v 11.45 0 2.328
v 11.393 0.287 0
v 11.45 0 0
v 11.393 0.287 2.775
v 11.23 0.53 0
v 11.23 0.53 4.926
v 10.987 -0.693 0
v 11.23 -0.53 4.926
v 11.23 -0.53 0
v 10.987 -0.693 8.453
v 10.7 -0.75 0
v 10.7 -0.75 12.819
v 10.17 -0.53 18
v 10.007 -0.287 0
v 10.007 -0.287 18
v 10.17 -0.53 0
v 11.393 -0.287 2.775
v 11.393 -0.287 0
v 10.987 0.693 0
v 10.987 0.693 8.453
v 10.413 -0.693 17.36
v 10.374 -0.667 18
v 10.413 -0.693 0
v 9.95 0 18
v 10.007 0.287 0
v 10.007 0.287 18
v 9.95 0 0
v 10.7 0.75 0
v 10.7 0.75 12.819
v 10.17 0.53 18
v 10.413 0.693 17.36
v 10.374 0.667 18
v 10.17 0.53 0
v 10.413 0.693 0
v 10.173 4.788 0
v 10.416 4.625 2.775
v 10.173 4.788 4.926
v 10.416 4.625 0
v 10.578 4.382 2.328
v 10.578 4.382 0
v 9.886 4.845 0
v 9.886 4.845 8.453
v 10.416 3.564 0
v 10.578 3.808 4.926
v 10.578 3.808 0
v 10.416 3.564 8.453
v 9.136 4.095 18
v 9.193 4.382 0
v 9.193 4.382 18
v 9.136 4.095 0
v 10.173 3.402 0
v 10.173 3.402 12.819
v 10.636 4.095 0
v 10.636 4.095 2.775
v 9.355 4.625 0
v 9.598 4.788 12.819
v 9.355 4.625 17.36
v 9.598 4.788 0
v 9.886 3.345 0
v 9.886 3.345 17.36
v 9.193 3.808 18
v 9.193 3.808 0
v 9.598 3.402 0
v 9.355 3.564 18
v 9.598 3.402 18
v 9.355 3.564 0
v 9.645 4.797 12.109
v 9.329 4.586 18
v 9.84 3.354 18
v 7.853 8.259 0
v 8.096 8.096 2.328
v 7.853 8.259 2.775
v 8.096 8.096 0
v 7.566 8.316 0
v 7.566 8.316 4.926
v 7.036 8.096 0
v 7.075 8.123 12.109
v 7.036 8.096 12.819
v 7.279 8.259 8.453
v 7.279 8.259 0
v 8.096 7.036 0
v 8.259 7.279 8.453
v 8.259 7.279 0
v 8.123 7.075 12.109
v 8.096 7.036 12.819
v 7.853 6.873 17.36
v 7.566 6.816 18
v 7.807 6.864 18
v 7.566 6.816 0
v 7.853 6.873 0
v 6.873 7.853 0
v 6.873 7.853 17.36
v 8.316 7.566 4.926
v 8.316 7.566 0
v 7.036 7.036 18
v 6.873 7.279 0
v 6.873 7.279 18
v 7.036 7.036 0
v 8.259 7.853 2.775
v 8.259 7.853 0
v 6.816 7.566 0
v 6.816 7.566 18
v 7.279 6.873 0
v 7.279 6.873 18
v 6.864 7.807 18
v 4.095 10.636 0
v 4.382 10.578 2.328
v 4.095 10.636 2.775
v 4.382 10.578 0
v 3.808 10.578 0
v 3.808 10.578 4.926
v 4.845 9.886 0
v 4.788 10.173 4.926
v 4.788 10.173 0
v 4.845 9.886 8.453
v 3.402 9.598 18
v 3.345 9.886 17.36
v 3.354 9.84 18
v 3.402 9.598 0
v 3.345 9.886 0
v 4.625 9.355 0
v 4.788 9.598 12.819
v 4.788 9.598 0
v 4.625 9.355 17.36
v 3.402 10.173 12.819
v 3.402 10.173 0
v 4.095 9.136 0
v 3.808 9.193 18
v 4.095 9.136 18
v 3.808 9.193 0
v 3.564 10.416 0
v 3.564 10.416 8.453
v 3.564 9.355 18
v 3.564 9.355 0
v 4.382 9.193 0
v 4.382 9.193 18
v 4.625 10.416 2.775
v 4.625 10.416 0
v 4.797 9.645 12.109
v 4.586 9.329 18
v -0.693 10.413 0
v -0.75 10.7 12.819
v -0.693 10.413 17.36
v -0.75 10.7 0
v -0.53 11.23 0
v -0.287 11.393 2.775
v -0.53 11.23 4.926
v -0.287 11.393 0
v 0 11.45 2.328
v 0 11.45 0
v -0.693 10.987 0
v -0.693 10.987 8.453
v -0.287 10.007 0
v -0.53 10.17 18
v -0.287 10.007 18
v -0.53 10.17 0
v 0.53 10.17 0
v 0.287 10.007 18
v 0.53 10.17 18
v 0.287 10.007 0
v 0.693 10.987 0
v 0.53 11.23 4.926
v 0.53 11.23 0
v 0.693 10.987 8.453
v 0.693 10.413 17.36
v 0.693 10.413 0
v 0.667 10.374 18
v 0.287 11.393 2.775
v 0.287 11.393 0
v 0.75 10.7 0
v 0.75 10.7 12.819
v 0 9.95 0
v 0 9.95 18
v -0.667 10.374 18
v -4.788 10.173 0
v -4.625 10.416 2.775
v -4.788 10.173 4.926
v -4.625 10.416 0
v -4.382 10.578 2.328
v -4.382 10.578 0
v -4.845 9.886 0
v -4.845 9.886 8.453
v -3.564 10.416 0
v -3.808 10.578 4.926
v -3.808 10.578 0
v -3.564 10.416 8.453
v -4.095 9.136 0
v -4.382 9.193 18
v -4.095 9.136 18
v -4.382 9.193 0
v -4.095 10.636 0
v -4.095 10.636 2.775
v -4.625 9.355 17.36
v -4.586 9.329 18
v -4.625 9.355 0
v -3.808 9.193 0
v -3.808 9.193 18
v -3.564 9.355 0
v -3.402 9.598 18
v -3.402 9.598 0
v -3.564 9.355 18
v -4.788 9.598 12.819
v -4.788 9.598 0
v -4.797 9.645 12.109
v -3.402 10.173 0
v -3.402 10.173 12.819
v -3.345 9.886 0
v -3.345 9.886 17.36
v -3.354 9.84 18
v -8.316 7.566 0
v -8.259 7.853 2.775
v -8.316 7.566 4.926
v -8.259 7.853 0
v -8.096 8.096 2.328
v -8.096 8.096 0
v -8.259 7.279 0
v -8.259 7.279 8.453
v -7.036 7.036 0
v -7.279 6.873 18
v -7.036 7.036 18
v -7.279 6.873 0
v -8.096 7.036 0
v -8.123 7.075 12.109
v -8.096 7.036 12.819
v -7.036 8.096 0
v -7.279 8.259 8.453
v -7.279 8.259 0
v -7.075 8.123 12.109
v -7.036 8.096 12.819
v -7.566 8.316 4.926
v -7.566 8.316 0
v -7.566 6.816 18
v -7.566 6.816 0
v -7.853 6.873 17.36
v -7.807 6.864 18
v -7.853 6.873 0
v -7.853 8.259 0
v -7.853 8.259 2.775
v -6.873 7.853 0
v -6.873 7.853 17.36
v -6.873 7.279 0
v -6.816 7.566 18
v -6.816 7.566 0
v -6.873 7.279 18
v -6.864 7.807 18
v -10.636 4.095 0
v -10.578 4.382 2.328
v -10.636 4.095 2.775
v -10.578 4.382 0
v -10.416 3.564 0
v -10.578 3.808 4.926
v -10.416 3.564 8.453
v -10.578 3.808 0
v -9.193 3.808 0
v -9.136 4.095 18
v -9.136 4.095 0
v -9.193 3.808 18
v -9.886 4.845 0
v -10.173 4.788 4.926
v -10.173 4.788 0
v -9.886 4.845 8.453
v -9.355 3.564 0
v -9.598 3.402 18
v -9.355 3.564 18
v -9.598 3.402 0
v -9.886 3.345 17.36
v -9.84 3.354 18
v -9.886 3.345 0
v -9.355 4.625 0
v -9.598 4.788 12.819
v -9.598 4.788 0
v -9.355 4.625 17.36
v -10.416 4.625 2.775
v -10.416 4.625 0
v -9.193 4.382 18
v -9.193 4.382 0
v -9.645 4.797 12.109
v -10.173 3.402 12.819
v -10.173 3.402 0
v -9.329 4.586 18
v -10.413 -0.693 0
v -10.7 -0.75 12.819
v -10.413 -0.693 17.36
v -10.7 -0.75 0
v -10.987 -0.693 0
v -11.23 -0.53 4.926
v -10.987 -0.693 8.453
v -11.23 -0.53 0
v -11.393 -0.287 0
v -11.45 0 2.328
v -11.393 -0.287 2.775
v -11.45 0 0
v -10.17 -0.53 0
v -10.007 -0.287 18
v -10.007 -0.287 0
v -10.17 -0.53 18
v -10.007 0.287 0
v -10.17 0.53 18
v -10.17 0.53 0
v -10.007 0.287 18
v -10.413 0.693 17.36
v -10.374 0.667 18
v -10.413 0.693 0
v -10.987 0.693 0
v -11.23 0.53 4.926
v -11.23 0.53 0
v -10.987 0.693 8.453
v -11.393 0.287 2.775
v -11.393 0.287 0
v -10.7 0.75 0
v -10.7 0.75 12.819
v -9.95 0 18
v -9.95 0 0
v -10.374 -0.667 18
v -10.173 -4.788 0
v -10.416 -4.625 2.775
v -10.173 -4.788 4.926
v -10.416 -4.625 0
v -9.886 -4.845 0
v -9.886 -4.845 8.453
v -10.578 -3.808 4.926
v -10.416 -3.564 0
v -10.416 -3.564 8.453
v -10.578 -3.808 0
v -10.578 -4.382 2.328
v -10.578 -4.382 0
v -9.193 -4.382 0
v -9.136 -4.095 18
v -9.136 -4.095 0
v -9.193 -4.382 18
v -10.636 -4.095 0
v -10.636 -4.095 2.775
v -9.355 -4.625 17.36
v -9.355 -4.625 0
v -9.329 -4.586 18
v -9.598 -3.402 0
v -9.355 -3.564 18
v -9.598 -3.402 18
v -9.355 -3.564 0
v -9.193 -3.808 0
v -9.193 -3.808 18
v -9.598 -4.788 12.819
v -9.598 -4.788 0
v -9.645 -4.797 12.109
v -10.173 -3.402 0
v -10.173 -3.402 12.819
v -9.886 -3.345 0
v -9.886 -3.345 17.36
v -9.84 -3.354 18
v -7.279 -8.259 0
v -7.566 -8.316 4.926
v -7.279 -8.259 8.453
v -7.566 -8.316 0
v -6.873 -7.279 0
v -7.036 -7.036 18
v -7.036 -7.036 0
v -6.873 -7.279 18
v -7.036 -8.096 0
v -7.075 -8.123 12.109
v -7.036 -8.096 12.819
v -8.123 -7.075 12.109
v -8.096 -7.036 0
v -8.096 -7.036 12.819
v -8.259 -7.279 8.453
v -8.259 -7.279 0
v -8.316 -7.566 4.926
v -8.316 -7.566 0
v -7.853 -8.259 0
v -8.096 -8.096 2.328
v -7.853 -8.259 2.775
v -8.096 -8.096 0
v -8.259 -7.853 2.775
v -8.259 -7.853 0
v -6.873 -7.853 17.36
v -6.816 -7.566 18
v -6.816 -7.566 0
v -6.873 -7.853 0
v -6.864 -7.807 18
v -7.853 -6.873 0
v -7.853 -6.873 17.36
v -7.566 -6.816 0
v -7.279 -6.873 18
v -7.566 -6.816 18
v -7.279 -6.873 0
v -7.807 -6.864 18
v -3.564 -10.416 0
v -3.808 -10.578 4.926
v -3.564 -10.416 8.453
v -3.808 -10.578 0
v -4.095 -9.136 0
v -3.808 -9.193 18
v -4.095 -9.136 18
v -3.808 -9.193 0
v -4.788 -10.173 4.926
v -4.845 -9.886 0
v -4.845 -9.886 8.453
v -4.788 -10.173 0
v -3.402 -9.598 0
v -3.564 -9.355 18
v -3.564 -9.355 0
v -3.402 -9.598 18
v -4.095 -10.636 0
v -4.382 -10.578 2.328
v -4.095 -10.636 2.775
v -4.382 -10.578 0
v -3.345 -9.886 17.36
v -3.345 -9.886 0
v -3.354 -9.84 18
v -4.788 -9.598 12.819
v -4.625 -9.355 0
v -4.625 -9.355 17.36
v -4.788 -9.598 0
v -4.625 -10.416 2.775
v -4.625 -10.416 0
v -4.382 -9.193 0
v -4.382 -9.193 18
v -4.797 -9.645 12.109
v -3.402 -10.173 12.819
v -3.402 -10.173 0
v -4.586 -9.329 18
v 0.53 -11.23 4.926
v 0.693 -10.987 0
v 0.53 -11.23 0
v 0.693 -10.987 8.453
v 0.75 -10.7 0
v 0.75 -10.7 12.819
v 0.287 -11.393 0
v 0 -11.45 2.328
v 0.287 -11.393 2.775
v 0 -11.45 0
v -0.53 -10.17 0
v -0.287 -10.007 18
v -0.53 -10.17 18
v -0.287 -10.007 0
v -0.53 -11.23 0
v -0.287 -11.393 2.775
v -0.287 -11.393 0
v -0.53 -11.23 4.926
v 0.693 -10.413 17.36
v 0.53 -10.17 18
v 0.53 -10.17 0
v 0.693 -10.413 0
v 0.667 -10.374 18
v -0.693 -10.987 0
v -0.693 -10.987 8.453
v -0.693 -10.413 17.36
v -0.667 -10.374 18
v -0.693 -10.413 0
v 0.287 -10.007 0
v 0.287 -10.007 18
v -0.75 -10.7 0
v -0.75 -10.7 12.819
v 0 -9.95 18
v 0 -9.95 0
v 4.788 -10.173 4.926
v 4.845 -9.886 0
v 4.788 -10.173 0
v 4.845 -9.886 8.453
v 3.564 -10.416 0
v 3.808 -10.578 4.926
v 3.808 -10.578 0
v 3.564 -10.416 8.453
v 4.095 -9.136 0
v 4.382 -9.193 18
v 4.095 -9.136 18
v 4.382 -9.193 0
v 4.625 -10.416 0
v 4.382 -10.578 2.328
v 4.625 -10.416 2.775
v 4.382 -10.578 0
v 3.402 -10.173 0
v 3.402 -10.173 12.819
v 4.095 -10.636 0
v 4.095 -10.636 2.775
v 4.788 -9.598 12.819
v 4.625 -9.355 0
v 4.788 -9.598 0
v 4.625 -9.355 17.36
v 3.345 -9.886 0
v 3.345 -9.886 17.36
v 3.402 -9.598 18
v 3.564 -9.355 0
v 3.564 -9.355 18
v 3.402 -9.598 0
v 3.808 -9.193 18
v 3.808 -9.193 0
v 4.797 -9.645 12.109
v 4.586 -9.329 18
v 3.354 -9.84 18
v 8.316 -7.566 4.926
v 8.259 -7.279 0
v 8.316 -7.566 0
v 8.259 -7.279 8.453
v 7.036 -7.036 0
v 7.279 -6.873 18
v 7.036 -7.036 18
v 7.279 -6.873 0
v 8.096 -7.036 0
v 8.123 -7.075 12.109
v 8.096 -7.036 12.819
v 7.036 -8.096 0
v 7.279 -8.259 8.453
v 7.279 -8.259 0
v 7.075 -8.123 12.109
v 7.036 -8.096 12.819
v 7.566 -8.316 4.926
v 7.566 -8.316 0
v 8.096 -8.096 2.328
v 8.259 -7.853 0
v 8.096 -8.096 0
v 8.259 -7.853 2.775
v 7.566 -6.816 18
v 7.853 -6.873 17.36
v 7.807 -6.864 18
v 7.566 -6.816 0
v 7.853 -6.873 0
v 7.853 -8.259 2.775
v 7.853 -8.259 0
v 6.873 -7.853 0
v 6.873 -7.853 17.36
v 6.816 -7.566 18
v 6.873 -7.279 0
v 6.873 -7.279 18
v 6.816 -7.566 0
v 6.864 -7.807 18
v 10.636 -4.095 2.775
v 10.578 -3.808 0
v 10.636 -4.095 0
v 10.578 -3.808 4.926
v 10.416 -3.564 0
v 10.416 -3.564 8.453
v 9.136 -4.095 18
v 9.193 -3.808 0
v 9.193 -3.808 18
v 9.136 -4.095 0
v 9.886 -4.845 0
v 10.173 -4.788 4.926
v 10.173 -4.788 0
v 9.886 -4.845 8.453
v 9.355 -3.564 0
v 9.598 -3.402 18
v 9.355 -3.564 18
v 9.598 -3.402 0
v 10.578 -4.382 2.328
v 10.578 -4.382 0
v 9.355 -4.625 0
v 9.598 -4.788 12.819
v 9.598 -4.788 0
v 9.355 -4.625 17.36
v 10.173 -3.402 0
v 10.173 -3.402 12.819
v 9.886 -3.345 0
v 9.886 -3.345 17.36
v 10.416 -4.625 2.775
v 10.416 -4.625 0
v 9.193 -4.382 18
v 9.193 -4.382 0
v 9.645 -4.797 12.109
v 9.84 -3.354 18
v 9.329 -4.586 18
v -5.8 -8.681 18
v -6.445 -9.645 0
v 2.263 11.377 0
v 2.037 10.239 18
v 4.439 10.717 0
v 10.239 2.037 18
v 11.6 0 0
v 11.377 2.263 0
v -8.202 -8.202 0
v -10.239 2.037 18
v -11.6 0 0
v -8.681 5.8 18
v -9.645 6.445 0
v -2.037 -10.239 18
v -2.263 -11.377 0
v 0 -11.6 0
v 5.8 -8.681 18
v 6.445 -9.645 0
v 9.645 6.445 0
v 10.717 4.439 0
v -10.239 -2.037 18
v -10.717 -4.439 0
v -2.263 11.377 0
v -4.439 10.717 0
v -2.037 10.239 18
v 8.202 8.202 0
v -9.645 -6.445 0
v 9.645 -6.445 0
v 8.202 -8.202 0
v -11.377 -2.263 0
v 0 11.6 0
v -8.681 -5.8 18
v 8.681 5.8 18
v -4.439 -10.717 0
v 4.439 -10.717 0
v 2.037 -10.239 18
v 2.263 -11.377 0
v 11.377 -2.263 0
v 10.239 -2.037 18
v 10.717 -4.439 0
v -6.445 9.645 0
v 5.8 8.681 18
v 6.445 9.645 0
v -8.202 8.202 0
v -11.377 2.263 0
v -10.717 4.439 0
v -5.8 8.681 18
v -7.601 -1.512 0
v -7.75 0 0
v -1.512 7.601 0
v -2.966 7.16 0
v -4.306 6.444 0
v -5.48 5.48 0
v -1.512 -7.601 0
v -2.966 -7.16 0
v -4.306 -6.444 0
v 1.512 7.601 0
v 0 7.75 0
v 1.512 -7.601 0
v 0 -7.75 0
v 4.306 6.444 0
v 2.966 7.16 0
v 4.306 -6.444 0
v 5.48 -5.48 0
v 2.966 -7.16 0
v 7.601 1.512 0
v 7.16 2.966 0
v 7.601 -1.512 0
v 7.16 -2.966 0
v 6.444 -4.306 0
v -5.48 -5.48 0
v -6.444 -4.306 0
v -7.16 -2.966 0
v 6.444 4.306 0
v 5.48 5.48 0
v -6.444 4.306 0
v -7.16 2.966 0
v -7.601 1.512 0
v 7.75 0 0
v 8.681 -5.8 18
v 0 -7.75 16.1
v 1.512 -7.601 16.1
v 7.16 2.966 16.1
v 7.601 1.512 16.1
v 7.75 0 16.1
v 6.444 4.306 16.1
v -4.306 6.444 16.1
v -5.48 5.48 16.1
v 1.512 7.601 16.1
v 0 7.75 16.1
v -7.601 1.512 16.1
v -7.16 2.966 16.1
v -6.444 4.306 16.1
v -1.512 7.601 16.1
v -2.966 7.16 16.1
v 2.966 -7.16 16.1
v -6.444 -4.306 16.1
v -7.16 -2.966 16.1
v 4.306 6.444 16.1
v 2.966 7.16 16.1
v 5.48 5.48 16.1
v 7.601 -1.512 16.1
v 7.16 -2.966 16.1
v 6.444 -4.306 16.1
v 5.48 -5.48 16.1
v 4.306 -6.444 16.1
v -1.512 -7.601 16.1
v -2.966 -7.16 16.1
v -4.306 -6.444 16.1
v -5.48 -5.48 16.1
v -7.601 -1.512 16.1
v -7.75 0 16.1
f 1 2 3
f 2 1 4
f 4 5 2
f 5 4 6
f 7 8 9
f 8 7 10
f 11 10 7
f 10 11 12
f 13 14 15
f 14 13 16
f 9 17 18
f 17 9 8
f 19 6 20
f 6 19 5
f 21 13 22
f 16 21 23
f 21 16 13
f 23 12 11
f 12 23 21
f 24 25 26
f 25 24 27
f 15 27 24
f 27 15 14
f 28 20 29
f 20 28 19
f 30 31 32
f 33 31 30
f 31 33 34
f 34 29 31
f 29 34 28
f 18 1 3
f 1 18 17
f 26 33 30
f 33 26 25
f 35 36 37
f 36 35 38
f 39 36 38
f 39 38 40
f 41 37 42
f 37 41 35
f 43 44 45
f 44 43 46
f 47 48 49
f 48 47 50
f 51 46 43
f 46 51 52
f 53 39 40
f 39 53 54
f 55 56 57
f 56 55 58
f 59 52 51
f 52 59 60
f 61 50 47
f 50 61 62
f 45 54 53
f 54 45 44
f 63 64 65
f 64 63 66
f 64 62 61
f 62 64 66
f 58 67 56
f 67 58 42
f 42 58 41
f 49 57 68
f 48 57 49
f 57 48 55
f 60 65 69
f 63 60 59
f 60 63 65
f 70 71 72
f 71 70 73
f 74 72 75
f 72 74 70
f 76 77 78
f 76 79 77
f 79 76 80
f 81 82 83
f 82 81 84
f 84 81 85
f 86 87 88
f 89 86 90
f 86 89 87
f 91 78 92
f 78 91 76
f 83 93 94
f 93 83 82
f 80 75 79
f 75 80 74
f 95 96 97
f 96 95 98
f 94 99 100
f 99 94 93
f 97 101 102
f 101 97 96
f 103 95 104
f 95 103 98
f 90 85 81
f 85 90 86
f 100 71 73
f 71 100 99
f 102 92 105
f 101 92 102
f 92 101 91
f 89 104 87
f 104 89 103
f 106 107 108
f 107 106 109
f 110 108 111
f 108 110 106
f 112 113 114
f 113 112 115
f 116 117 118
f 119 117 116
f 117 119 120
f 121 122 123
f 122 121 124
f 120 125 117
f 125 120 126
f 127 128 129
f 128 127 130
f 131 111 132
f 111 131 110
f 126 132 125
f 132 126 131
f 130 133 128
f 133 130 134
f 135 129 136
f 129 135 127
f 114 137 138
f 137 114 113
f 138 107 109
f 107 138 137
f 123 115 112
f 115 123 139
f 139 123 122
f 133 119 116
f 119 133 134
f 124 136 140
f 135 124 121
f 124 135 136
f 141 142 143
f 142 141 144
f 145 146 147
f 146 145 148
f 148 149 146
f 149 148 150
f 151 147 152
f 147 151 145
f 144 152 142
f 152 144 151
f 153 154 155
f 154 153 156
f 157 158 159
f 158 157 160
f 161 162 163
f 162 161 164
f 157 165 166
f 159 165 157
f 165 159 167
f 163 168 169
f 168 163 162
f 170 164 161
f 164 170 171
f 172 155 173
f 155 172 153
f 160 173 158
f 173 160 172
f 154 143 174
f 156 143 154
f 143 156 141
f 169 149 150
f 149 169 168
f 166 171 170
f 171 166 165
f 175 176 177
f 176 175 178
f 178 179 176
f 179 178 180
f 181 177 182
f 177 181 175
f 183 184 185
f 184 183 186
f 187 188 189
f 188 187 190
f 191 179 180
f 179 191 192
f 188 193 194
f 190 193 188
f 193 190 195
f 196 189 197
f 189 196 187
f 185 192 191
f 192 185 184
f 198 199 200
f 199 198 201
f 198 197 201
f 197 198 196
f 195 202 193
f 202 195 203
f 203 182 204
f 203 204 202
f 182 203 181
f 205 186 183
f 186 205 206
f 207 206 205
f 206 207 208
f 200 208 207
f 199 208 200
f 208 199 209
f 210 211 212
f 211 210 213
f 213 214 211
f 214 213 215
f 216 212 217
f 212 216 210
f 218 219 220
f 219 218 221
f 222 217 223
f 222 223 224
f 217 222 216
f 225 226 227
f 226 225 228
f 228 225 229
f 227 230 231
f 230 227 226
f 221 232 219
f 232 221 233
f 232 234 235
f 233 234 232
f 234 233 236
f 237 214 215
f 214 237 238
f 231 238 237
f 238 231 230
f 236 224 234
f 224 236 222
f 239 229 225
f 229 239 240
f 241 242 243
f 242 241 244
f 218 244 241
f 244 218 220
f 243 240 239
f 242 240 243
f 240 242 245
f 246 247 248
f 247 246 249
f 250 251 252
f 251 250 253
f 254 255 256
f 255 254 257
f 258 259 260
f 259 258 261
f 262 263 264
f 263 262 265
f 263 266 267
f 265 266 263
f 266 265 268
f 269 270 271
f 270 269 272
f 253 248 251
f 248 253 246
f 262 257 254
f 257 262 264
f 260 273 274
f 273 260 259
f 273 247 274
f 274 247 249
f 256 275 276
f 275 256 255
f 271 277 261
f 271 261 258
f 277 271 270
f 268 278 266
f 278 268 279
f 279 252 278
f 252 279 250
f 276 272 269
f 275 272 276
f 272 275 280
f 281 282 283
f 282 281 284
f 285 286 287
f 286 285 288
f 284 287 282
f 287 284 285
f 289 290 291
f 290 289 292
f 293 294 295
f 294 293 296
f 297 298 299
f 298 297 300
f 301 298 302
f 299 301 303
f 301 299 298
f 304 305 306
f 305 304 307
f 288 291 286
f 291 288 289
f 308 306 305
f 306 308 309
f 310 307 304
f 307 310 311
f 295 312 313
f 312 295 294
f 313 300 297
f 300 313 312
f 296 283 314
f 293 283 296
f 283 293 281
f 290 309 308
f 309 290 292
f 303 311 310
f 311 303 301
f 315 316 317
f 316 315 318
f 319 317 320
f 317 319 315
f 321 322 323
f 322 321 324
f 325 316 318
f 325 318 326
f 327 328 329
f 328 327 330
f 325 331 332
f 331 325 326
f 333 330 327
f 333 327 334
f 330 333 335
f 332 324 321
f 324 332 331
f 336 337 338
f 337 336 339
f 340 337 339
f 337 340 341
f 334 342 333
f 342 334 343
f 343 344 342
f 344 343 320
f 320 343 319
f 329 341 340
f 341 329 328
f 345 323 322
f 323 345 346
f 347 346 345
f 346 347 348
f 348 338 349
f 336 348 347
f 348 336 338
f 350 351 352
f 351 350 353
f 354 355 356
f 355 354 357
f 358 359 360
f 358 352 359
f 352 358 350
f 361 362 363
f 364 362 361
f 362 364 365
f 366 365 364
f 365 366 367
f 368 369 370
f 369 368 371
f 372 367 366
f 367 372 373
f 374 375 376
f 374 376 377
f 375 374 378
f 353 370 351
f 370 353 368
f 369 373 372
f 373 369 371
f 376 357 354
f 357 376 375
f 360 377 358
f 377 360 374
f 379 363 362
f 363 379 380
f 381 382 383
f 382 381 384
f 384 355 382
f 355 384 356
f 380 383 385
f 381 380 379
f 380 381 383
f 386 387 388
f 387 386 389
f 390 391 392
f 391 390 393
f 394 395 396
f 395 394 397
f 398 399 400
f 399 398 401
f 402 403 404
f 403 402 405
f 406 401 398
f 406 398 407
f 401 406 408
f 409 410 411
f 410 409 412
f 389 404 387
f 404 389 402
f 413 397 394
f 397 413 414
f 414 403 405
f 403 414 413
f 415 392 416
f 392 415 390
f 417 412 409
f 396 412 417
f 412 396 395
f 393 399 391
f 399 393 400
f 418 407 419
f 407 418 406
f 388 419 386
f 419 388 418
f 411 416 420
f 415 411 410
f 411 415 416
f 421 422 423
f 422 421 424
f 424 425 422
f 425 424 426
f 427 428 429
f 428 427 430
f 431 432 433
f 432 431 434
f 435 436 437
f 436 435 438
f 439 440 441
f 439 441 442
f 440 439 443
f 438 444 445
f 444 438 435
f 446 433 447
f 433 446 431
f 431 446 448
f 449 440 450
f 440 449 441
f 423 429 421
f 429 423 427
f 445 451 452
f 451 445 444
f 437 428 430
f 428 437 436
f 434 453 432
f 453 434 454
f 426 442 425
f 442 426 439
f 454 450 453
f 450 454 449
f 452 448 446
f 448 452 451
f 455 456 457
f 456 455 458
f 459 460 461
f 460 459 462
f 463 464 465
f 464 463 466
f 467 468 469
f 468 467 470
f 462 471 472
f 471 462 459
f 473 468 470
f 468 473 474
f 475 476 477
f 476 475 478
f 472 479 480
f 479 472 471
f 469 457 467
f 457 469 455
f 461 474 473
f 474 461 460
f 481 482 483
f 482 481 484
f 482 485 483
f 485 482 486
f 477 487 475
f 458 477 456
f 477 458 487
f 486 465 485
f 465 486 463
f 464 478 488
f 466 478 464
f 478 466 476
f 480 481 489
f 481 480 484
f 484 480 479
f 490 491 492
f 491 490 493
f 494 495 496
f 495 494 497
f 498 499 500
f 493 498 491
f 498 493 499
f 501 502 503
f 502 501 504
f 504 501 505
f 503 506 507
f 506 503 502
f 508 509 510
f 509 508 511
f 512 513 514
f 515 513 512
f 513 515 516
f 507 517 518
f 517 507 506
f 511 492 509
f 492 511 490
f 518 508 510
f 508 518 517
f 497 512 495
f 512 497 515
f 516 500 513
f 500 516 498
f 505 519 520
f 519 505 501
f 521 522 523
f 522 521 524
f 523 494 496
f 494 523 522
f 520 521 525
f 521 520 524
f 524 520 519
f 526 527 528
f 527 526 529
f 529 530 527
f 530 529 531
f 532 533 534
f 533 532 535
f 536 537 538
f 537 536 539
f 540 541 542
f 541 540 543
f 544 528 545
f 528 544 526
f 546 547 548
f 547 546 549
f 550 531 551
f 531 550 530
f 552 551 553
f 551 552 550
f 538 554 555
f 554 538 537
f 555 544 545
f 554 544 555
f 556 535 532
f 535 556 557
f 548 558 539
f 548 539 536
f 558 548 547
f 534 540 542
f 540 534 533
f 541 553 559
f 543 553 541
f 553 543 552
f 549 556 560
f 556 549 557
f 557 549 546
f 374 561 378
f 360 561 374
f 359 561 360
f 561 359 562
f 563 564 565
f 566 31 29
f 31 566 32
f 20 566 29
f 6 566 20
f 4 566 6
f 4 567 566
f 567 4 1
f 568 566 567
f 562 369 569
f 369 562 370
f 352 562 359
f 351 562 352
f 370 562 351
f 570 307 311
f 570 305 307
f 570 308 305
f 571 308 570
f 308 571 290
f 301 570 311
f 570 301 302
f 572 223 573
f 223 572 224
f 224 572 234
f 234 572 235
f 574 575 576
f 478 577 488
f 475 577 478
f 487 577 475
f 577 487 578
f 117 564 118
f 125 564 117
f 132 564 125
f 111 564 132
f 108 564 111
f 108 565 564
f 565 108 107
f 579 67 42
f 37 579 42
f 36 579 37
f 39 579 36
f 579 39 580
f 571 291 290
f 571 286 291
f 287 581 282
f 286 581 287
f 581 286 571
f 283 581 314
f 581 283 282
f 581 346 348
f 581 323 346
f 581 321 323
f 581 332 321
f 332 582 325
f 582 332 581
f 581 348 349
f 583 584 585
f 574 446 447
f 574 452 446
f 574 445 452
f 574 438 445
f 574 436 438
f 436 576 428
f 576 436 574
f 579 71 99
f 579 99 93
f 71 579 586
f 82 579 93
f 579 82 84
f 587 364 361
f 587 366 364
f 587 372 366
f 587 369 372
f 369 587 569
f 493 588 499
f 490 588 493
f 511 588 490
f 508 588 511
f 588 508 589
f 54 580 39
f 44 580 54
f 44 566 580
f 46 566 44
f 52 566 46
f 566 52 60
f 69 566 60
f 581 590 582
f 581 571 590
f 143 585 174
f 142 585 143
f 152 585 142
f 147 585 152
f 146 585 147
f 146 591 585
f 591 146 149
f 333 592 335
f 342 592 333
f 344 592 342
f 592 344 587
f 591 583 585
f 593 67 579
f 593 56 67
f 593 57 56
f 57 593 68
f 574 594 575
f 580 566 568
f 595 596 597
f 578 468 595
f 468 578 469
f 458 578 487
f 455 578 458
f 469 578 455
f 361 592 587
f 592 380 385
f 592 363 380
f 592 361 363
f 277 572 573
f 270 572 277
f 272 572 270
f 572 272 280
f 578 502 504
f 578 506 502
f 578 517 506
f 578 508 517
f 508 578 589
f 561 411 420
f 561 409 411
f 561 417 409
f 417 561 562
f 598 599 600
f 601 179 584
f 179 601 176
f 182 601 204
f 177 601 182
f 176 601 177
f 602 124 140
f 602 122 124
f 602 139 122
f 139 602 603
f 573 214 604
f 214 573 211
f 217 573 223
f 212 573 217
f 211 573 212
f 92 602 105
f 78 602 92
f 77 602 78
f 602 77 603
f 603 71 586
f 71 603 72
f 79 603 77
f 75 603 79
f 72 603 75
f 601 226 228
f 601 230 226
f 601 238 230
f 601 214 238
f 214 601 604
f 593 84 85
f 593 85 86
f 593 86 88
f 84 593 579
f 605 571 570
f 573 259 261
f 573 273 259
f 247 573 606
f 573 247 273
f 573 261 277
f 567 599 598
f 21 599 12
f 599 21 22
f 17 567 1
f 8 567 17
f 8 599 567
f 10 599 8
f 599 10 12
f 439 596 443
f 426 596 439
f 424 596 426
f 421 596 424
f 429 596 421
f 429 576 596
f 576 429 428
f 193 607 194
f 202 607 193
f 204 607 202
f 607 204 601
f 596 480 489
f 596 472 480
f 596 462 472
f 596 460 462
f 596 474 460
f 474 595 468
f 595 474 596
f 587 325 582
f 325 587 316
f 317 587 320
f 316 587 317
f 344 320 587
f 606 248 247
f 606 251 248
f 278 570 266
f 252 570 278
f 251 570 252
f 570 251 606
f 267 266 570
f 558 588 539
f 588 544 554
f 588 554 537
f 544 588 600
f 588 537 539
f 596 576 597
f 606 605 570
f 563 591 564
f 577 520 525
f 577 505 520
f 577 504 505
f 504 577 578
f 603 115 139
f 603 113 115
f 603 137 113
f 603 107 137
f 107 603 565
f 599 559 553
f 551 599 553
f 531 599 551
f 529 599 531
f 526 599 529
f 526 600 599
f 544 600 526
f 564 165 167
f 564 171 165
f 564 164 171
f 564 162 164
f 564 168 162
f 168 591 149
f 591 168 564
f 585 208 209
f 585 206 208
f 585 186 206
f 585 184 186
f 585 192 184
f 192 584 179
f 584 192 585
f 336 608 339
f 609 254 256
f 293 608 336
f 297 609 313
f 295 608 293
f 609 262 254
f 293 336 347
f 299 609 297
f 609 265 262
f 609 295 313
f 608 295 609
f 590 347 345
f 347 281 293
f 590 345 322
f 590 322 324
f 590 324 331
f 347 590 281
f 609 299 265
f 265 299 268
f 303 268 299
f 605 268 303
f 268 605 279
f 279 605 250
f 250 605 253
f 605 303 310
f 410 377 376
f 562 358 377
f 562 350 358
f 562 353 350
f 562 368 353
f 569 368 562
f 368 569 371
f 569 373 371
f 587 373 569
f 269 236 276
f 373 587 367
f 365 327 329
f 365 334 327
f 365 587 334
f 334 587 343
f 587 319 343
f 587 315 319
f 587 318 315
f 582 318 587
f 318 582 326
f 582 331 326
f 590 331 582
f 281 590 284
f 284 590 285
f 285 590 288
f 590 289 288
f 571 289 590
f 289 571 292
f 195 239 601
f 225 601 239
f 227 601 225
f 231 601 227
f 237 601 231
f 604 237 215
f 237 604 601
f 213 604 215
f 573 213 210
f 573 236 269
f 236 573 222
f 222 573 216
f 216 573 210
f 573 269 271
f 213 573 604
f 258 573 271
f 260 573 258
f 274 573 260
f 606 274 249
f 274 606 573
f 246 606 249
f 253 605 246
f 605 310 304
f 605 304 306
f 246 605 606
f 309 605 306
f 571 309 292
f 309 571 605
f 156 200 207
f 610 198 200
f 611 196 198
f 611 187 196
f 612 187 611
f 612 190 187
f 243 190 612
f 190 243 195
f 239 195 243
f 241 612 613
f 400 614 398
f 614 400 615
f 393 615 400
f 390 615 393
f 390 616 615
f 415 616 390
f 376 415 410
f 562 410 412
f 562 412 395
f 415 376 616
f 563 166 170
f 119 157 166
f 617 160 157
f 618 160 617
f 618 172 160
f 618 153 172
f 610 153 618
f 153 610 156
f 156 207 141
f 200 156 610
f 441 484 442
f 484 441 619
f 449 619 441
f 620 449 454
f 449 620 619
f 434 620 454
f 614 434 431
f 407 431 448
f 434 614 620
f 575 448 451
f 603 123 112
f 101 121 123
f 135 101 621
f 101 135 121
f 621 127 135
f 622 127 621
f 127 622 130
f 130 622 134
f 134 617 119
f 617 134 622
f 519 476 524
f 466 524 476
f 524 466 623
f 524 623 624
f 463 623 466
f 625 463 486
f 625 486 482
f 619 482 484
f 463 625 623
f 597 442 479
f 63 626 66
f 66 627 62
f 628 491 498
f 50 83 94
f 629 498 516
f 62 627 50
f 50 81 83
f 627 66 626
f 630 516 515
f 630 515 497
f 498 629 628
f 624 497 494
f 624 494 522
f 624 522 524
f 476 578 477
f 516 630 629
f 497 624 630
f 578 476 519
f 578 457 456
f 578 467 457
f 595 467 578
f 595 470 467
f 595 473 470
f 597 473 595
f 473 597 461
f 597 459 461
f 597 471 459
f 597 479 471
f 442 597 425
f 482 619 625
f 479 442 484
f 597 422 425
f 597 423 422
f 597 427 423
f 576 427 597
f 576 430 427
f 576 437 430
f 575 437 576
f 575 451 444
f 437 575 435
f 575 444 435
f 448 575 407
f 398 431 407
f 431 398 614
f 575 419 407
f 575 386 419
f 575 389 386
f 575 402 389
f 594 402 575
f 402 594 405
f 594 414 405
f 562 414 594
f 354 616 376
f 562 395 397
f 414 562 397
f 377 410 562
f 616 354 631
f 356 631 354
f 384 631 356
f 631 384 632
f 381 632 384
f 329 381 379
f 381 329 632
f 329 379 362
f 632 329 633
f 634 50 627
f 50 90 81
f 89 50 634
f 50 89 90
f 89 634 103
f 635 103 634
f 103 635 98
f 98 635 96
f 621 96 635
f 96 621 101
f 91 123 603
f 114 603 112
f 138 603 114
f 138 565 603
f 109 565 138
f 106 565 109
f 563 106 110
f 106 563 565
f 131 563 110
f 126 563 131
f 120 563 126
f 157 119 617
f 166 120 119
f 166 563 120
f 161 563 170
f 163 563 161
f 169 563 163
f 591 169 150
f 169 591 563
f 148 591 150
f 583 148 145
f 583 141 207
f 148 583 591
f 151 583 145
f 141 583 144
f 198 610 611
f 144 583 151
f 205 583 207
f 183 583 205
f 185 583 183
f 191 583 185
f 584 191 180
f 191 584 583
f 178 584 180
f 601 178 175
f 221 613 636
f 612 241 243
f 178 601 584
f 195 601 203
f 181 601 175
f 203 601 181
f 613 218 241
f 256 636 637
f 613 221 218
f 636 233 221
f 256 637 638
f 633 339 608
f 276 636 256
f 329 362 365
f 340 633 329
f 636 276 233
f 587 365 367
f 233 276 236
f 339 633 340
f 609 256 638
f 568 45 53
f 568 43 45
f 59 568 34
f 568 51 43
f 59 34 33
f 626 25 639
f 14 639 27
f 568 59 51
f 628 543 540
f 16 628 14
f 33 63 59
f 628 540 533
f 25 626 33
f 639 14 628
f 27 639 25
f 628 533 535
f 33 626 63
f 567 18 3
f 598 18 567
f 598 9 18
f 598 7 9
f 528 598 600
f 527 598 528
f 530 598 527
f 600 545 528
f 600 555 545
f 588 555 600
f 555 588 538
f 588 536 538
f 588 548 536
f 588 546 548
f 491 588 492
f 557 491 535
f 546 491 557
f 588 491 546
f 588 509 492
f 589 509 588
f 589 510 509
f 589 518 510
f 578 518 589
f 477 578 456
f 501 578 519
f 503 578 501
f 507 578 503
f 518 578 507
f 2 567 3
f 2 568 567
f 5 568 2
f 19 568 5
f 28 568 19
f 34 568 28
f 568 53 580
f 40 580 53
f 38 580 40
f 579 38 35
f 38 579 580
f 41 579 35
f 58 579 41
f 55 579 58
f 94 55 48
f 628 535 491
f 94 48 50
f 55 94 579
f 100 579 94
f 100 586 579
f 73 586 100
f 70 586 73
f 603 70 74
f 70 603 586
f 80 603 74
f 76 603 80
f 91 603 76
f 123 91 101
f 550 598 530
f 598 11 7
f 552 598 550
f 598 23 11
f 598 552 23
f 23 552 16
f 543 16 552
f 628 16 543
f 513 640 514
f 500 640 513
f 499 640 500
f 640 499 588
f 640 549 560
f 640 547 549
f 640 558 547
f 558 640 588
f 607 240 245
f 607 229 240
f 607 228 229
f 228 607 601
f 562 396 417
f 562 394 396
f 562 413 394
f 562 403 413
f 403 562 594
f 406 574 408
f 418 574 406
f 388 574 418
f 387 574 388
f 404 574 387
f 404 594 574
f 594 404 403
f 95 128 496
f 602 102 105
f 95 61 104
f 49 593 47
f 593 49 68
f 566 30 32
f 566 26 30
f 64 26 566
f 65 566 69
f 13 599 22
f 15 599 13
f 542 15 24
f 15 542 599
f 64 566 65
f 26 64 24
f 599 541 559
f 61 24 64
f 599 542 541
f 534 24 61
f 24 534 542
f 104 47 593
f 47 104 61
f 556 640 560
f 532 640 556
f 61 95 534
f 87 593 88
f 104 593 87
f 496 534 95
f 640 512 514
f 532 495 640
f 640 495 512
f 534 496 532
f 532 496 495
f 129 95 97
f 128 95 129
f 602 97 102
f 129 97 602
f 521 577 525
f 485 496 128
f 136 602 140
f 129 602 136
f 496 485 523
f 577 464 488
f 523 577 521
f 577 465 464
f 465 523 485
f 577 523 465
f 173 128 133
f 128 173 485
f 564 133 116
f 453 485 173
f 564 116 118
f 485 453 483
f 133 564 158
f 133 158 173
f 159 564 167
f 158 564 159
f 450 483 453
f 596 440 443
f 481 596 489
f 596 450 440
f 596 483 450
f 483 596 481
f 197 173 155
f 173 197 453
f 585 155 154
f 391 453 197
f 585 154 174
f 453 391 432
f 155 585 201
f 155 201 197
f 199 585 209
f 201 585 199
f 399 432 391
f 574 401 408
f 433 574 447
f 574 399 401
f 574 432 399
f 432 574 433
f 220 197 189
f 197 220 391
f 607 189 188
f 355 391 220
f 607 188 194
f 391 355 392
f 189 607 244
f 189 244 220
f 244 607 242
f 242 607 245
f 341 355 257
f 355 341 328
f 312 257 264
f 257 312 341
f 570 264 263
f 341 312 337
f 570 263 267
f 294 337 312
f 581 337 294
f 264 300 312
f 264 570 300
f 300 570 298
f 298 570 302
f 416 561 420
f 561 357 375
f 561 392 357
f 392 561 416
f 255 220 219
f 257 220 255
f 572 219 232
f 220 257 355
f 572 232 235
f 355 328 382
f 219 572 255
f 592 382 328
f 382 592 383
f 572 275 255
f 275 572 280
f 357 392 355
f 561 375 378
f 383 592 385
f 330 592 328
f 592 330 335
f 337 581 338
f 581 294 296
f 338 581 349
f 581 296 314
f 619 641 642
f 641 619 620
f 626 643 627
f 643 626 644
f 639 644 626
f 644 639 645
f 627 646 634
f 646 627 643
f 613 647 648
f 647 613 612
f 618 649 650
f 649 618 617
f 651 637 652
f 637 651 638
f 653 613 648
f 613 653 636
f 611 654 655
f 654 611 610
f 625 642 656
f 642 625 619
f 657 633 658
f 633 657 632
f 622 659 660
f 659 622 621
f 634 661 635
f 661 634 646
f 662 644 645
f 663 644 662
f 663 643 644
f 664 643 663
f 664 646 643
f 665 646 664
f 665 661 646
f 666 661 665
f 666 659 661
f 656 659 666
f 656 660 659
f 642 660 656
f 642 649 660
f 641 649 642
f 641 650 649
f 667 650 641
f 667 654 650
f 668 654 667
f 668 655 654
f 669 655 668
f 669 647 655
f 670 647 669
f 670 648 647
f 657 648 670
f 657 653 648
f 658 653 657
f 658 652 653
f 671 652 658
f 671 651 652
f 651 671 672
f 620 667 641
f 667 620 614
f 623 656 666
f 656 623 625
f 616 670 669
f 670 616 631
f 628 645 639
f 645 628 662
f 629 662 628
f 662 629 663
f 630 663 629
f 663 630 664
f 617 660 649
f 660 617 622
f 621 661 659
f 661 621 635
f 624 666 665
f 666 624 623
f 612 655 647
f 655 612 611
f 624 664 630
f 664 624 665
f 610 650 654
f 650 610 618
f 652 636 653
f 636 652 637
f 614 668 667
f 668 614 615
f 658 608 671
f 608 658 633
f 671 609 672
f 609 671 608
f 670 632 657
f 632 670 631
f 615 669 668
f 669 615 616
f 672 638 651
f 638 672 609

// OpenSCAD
// ACCESS KNOB — Synthesis Technology / XOR Electronics Knob (Slip-On Sleeve)
// Generated via CLI for Studio Knobs (Slip-On Sleeve)
module access_knob_xor_synth_slipon() {
  outer_d = 23.2;
  height = 18;
  taper = 0.9;
  bore_d = 15.2;
  slot_h = 16;
  tex_depth = 1.8;
  tex_scale = 1.5;
  tex_count = 16;

  difference() {
    cylinder(h=height, d1=outer_d, d2=outer_d*taper, $fn=32);
    translate([0,0,-0.1]) cylinder(h=slot_h+0.2, d=bore_d + 0.3, $fn=32);
    for(i=[0:tex_count-1]) {
      rotate([0,0,i*(360/tex_count)])
        translate([outer_d/2-tex_depth/2, 0, height/2])
          cylinder(h=height*1.1, d=tex_scale, center=true, $fn=16);
    }
  }
}
access_knob_xor_synth_slipon();
